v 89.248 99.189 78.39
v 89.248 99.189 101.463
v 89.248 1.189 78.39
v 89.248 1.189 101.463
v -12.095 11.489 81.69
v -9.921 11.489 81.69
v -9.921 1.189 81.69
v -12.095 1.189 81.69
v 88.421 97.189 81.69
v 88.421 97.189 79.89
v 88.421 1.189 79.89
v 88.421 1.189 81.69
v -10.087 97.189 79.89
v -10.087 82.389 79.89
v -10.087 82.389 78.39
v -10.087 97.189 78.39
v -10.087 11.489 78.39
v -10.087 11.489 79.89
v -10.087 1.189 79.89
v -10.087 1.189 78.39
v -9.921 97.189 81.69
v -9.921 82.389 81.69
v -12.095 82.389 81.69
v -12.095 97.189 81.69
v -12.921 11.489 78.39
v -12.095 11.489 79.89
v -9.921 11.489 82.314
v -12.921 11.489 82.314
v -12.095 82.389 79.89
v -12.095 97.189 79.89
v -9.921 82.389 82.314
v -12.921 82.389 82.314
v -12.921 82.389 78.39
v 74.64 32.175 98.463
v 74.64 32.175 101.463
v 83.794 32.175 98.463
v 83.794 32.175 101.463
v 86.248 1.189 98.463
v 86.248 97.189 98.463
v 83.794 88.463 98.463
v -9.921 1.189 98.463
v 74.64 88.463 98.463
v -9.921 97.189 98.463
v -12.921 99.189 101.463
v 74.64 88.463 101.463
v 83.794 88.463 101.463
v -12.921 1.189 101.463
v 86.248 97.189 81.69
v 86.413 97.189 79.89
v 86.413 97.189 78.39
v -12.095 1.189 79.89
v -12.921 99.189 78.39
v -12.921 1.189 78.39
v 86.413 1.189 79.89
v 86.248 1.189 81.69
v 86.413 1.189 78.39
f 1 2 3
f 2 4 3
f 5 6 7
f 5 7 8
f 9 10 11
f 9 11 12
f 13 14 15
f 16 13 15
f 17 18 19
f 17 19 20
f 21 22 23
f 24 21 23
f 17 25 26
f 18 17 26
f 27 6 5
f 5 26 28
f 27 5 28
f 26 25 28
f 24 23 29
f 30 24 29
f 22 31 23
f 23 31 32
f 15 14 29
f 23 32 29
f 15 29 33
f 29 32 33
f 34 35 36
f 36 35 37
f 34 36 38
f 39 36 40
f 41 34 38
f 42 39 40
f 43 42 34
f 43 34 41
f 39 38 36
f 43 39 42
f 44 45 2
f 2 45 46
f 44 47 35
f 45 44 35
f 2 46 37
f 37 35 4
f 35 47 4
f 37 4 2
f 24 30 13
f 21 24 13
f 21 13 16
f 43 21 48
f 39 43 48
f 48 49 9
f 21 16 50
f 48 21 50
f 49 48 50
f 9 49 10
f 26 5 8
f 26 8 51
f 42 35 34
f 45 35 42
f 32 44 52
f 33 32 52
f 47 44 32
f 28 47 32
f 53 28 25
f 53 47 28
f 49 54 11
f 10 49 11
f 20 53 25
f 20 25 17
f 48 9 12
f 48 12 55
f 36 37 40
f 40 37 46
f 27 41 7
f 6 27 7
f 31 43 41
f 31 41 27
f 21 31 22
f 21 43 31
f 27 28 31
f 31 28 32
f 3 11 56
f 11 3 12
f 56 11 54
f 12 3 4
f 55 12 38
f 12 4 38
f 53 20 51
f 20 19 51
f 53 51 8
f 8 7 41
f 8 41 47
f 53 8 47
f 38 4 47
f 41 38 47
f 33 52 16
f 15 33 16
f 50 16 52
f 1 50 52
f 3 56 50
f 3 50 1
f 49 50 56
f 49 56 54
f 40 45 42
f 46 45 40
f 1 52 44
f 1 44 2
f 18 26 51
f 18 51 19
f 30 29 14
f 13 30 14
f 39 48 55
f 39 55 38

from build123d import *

# Parameters (mm, degrees)
BOSS_EXTRUDE1_DEPTH      = 1
BOSS_EXTRUDE1_DEPTH_BACK = 95
SKETCH3_W                = 102.168296719
SKETCH3_H                = 23.073037812
BOSS_EXTRUDE2_DEPTH      = 2
CUT_EXTRUDE1_DEPTH       = 7
SKETCH5_W                = 9.153790551
SKETCH5_H                = 56.288421304
CUT_EXTRUDE2_DEPTH       = 12


with BuildPart() as part:
    # Sketch1 → Boss-Extrude1 (new, two sides: drawn at the far end of the back side and taken through both)
    with BuildSketch(Plane(origin=(1.86e-07, 2.18892535, 0), x_dir=(0.9999999999999963, -8.499370700000005e-08, 0), z_dir=(-8.499370700000005e-08, -0.9999999999999964, 0)).offset(-BOSS_EXTRUDE1_DEPTH_BACK)):
        Polygon((-10.086587255, 78.390258261), (-12.920734899, 78.390258261), (-12.920734899, 101.463296073), (89.24756182, 101.463296073), (89.24756182, 78.390258261), (86.413414176, 78.390258261), (86.413414176, 79.890257832), (88.421490182, 79.890257832), (88.421490182, 81.69025819), (86.24756182, 81.69025819), (86.24756182, 98.463296073), (-9.920734899, 98.463296073), (-9.920734899, 81.69025819), (-12.094663261, 81.69025819), (-12.094663261, 79.890257832), (-10.086587255, 79.890257832), align=None)
    extrude(amount=BOSS_EXTRUDE1_DEPTH + BOSS_EXTRUDE1_DEPTH_BACK)

    # Sketch3 → Boss-Extrude2 (add)
    with BuildSketch(Plane(origin=(8.26e-06, 97.18892535, 0), x_dir=(0.9999999999999963, -8.499370702344177e-08, 0), z_dir=(8.499370702344177e-08, 0.9999999999999964, 0))):
        with Locations((38.163413461, -89.926777167)):
            Rectangle(SKETCH3_W, SKETCH3_H)
    extrude(amount=BOSS_EXTRUDE2_DEPTH)

    # Sketch4 → Cut-Extrude1 (cut)
    with BuildSketch(Plane(origin=(-12.920734899, 1.098e-06, 0), x_dir=(0, 0, 1), z_dir=(-0.9999999999999964, 8.499370700000005e-08, 0))):
        Polygon((78.390258261, 11.48892535), (82.313500316, 11.48892535), (82.313500316, 82.388929164), (78.390258261, 82.388929164), (75.766454091, 82.388929164), (75.766454091, 11.48892535), align=None)
    extrude(amount=-CUT_EXTRUDE1_DEPTH, mode=Mode.SUBTRACT)

    # Sketch5 → Cut-Extrude2 (cut)
    with BuildSketch(Plane.XY.offset(101.463296073)):
        with Locations((79.217116041, 60.318884388)):
            Rectangle(SKETCH5_W, SKETCH5_H)
    extrude(amount=-CUT_EXTRUDE2_DEPTH, mode=Mode.SUBTRACT)


solid = part.part
